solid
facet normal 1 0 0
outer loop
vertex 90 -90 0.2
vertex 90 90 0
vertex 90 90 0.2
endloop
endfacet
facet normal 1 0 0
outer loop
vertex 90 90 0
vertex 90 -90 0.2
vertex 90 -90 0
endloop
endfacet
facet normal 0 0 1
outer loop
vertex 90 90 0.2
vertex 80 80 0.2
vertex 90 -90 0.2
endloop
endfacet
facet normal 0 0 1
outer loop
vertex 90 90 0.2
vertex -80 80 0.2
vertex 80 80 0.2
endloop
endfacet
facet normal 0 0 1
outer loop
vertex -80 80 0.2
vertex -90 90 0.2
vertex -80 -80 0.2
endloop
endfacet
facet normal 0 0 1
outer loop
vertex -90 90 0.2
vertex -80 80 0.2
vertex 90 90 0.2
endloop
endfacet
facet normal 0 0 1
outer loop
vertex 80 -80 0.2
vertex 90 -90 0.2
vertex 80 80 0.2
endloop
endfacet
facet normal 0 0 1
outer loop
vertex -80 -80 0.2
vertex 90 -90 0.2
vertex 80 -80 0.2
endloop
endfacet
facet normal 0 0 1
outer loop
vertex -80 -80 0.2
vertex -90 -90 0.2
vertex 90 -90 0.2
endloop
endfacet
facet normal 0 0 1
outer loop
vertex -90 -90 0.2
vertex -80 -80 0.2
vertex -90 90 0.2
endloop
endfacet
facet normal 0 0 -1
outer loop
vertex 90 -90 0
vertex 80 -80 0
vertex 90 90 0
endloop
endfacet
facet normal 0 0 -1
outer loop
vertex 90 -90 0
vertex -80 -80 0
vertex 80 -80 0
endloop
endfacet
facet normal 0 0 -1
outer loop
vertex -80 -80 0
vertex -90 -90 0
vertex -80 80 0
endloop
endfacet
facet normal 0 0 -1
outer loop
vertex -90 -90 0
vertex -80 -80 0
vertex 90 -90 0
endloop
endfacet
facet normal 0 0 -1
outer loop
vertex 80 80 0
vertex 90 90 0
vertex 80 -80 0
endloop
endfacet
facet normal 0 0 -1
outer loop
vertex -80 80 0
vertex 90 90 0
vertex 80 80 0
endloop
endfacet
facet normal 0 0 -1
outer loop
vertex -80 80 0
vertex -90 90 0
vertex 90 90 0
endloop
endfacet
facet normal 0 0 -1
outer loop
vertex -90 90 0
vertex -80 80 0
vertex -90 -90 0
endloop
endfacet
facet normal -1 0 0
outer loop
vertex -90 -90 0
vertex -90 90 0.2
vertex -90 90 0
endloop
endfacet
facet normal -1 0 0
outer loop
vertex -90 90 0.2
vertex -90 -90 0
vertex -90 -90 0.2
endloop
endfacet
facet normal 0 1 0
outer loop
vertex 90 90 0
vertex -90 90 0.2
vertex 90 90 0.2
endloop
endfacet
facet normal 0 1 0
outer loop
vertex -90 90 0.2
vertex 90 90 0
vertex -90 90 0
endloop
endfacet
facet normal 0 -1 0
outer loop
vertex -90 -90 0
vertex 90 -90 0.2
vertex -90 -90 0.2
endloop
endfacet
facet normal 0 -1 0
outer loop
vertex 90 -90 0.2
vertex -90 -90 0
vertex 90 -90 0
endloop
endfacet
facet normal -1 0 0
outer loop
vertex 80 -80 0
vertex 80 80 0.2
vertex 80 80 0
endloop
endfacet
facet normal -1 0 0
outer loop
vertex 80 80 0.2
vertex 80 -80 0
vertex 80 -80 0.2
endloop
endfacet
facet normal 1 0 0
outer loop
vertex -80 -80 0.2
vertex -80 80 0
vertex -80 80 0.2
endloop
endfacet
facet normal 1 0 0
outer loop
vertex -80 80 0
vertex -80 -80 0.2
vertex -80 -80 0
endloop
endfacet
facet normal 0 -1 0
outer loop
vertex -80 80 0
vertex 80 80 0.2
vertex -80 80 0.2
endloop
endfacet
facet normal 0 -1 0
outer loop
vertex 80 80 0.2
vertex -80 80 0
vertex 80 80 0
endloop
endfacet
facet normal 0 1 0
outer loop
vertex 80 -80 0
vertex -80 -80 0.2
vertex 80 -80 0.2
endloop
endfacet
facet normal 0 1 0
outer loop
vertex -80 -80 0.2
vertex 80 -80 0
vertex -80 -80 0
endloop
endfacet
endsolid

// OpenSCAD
$fn=200;

x=180;
y=180;
b=10;
t=.2;

//circle();
square();

module circle(){
    difference(){
        cylinder(d=y, h=t);
        
        translate([0,0,-.1])
        cylinder(d=y-b*2, h=t+1);
    }
}

module square(){
    translate([-x/2,-y/2,0])
    difference(){
        cube([x,y,t]);
        
        translate([b,b,-.1])
        cube([x-b*2,y-b*2,t+1]);
    }    
}
